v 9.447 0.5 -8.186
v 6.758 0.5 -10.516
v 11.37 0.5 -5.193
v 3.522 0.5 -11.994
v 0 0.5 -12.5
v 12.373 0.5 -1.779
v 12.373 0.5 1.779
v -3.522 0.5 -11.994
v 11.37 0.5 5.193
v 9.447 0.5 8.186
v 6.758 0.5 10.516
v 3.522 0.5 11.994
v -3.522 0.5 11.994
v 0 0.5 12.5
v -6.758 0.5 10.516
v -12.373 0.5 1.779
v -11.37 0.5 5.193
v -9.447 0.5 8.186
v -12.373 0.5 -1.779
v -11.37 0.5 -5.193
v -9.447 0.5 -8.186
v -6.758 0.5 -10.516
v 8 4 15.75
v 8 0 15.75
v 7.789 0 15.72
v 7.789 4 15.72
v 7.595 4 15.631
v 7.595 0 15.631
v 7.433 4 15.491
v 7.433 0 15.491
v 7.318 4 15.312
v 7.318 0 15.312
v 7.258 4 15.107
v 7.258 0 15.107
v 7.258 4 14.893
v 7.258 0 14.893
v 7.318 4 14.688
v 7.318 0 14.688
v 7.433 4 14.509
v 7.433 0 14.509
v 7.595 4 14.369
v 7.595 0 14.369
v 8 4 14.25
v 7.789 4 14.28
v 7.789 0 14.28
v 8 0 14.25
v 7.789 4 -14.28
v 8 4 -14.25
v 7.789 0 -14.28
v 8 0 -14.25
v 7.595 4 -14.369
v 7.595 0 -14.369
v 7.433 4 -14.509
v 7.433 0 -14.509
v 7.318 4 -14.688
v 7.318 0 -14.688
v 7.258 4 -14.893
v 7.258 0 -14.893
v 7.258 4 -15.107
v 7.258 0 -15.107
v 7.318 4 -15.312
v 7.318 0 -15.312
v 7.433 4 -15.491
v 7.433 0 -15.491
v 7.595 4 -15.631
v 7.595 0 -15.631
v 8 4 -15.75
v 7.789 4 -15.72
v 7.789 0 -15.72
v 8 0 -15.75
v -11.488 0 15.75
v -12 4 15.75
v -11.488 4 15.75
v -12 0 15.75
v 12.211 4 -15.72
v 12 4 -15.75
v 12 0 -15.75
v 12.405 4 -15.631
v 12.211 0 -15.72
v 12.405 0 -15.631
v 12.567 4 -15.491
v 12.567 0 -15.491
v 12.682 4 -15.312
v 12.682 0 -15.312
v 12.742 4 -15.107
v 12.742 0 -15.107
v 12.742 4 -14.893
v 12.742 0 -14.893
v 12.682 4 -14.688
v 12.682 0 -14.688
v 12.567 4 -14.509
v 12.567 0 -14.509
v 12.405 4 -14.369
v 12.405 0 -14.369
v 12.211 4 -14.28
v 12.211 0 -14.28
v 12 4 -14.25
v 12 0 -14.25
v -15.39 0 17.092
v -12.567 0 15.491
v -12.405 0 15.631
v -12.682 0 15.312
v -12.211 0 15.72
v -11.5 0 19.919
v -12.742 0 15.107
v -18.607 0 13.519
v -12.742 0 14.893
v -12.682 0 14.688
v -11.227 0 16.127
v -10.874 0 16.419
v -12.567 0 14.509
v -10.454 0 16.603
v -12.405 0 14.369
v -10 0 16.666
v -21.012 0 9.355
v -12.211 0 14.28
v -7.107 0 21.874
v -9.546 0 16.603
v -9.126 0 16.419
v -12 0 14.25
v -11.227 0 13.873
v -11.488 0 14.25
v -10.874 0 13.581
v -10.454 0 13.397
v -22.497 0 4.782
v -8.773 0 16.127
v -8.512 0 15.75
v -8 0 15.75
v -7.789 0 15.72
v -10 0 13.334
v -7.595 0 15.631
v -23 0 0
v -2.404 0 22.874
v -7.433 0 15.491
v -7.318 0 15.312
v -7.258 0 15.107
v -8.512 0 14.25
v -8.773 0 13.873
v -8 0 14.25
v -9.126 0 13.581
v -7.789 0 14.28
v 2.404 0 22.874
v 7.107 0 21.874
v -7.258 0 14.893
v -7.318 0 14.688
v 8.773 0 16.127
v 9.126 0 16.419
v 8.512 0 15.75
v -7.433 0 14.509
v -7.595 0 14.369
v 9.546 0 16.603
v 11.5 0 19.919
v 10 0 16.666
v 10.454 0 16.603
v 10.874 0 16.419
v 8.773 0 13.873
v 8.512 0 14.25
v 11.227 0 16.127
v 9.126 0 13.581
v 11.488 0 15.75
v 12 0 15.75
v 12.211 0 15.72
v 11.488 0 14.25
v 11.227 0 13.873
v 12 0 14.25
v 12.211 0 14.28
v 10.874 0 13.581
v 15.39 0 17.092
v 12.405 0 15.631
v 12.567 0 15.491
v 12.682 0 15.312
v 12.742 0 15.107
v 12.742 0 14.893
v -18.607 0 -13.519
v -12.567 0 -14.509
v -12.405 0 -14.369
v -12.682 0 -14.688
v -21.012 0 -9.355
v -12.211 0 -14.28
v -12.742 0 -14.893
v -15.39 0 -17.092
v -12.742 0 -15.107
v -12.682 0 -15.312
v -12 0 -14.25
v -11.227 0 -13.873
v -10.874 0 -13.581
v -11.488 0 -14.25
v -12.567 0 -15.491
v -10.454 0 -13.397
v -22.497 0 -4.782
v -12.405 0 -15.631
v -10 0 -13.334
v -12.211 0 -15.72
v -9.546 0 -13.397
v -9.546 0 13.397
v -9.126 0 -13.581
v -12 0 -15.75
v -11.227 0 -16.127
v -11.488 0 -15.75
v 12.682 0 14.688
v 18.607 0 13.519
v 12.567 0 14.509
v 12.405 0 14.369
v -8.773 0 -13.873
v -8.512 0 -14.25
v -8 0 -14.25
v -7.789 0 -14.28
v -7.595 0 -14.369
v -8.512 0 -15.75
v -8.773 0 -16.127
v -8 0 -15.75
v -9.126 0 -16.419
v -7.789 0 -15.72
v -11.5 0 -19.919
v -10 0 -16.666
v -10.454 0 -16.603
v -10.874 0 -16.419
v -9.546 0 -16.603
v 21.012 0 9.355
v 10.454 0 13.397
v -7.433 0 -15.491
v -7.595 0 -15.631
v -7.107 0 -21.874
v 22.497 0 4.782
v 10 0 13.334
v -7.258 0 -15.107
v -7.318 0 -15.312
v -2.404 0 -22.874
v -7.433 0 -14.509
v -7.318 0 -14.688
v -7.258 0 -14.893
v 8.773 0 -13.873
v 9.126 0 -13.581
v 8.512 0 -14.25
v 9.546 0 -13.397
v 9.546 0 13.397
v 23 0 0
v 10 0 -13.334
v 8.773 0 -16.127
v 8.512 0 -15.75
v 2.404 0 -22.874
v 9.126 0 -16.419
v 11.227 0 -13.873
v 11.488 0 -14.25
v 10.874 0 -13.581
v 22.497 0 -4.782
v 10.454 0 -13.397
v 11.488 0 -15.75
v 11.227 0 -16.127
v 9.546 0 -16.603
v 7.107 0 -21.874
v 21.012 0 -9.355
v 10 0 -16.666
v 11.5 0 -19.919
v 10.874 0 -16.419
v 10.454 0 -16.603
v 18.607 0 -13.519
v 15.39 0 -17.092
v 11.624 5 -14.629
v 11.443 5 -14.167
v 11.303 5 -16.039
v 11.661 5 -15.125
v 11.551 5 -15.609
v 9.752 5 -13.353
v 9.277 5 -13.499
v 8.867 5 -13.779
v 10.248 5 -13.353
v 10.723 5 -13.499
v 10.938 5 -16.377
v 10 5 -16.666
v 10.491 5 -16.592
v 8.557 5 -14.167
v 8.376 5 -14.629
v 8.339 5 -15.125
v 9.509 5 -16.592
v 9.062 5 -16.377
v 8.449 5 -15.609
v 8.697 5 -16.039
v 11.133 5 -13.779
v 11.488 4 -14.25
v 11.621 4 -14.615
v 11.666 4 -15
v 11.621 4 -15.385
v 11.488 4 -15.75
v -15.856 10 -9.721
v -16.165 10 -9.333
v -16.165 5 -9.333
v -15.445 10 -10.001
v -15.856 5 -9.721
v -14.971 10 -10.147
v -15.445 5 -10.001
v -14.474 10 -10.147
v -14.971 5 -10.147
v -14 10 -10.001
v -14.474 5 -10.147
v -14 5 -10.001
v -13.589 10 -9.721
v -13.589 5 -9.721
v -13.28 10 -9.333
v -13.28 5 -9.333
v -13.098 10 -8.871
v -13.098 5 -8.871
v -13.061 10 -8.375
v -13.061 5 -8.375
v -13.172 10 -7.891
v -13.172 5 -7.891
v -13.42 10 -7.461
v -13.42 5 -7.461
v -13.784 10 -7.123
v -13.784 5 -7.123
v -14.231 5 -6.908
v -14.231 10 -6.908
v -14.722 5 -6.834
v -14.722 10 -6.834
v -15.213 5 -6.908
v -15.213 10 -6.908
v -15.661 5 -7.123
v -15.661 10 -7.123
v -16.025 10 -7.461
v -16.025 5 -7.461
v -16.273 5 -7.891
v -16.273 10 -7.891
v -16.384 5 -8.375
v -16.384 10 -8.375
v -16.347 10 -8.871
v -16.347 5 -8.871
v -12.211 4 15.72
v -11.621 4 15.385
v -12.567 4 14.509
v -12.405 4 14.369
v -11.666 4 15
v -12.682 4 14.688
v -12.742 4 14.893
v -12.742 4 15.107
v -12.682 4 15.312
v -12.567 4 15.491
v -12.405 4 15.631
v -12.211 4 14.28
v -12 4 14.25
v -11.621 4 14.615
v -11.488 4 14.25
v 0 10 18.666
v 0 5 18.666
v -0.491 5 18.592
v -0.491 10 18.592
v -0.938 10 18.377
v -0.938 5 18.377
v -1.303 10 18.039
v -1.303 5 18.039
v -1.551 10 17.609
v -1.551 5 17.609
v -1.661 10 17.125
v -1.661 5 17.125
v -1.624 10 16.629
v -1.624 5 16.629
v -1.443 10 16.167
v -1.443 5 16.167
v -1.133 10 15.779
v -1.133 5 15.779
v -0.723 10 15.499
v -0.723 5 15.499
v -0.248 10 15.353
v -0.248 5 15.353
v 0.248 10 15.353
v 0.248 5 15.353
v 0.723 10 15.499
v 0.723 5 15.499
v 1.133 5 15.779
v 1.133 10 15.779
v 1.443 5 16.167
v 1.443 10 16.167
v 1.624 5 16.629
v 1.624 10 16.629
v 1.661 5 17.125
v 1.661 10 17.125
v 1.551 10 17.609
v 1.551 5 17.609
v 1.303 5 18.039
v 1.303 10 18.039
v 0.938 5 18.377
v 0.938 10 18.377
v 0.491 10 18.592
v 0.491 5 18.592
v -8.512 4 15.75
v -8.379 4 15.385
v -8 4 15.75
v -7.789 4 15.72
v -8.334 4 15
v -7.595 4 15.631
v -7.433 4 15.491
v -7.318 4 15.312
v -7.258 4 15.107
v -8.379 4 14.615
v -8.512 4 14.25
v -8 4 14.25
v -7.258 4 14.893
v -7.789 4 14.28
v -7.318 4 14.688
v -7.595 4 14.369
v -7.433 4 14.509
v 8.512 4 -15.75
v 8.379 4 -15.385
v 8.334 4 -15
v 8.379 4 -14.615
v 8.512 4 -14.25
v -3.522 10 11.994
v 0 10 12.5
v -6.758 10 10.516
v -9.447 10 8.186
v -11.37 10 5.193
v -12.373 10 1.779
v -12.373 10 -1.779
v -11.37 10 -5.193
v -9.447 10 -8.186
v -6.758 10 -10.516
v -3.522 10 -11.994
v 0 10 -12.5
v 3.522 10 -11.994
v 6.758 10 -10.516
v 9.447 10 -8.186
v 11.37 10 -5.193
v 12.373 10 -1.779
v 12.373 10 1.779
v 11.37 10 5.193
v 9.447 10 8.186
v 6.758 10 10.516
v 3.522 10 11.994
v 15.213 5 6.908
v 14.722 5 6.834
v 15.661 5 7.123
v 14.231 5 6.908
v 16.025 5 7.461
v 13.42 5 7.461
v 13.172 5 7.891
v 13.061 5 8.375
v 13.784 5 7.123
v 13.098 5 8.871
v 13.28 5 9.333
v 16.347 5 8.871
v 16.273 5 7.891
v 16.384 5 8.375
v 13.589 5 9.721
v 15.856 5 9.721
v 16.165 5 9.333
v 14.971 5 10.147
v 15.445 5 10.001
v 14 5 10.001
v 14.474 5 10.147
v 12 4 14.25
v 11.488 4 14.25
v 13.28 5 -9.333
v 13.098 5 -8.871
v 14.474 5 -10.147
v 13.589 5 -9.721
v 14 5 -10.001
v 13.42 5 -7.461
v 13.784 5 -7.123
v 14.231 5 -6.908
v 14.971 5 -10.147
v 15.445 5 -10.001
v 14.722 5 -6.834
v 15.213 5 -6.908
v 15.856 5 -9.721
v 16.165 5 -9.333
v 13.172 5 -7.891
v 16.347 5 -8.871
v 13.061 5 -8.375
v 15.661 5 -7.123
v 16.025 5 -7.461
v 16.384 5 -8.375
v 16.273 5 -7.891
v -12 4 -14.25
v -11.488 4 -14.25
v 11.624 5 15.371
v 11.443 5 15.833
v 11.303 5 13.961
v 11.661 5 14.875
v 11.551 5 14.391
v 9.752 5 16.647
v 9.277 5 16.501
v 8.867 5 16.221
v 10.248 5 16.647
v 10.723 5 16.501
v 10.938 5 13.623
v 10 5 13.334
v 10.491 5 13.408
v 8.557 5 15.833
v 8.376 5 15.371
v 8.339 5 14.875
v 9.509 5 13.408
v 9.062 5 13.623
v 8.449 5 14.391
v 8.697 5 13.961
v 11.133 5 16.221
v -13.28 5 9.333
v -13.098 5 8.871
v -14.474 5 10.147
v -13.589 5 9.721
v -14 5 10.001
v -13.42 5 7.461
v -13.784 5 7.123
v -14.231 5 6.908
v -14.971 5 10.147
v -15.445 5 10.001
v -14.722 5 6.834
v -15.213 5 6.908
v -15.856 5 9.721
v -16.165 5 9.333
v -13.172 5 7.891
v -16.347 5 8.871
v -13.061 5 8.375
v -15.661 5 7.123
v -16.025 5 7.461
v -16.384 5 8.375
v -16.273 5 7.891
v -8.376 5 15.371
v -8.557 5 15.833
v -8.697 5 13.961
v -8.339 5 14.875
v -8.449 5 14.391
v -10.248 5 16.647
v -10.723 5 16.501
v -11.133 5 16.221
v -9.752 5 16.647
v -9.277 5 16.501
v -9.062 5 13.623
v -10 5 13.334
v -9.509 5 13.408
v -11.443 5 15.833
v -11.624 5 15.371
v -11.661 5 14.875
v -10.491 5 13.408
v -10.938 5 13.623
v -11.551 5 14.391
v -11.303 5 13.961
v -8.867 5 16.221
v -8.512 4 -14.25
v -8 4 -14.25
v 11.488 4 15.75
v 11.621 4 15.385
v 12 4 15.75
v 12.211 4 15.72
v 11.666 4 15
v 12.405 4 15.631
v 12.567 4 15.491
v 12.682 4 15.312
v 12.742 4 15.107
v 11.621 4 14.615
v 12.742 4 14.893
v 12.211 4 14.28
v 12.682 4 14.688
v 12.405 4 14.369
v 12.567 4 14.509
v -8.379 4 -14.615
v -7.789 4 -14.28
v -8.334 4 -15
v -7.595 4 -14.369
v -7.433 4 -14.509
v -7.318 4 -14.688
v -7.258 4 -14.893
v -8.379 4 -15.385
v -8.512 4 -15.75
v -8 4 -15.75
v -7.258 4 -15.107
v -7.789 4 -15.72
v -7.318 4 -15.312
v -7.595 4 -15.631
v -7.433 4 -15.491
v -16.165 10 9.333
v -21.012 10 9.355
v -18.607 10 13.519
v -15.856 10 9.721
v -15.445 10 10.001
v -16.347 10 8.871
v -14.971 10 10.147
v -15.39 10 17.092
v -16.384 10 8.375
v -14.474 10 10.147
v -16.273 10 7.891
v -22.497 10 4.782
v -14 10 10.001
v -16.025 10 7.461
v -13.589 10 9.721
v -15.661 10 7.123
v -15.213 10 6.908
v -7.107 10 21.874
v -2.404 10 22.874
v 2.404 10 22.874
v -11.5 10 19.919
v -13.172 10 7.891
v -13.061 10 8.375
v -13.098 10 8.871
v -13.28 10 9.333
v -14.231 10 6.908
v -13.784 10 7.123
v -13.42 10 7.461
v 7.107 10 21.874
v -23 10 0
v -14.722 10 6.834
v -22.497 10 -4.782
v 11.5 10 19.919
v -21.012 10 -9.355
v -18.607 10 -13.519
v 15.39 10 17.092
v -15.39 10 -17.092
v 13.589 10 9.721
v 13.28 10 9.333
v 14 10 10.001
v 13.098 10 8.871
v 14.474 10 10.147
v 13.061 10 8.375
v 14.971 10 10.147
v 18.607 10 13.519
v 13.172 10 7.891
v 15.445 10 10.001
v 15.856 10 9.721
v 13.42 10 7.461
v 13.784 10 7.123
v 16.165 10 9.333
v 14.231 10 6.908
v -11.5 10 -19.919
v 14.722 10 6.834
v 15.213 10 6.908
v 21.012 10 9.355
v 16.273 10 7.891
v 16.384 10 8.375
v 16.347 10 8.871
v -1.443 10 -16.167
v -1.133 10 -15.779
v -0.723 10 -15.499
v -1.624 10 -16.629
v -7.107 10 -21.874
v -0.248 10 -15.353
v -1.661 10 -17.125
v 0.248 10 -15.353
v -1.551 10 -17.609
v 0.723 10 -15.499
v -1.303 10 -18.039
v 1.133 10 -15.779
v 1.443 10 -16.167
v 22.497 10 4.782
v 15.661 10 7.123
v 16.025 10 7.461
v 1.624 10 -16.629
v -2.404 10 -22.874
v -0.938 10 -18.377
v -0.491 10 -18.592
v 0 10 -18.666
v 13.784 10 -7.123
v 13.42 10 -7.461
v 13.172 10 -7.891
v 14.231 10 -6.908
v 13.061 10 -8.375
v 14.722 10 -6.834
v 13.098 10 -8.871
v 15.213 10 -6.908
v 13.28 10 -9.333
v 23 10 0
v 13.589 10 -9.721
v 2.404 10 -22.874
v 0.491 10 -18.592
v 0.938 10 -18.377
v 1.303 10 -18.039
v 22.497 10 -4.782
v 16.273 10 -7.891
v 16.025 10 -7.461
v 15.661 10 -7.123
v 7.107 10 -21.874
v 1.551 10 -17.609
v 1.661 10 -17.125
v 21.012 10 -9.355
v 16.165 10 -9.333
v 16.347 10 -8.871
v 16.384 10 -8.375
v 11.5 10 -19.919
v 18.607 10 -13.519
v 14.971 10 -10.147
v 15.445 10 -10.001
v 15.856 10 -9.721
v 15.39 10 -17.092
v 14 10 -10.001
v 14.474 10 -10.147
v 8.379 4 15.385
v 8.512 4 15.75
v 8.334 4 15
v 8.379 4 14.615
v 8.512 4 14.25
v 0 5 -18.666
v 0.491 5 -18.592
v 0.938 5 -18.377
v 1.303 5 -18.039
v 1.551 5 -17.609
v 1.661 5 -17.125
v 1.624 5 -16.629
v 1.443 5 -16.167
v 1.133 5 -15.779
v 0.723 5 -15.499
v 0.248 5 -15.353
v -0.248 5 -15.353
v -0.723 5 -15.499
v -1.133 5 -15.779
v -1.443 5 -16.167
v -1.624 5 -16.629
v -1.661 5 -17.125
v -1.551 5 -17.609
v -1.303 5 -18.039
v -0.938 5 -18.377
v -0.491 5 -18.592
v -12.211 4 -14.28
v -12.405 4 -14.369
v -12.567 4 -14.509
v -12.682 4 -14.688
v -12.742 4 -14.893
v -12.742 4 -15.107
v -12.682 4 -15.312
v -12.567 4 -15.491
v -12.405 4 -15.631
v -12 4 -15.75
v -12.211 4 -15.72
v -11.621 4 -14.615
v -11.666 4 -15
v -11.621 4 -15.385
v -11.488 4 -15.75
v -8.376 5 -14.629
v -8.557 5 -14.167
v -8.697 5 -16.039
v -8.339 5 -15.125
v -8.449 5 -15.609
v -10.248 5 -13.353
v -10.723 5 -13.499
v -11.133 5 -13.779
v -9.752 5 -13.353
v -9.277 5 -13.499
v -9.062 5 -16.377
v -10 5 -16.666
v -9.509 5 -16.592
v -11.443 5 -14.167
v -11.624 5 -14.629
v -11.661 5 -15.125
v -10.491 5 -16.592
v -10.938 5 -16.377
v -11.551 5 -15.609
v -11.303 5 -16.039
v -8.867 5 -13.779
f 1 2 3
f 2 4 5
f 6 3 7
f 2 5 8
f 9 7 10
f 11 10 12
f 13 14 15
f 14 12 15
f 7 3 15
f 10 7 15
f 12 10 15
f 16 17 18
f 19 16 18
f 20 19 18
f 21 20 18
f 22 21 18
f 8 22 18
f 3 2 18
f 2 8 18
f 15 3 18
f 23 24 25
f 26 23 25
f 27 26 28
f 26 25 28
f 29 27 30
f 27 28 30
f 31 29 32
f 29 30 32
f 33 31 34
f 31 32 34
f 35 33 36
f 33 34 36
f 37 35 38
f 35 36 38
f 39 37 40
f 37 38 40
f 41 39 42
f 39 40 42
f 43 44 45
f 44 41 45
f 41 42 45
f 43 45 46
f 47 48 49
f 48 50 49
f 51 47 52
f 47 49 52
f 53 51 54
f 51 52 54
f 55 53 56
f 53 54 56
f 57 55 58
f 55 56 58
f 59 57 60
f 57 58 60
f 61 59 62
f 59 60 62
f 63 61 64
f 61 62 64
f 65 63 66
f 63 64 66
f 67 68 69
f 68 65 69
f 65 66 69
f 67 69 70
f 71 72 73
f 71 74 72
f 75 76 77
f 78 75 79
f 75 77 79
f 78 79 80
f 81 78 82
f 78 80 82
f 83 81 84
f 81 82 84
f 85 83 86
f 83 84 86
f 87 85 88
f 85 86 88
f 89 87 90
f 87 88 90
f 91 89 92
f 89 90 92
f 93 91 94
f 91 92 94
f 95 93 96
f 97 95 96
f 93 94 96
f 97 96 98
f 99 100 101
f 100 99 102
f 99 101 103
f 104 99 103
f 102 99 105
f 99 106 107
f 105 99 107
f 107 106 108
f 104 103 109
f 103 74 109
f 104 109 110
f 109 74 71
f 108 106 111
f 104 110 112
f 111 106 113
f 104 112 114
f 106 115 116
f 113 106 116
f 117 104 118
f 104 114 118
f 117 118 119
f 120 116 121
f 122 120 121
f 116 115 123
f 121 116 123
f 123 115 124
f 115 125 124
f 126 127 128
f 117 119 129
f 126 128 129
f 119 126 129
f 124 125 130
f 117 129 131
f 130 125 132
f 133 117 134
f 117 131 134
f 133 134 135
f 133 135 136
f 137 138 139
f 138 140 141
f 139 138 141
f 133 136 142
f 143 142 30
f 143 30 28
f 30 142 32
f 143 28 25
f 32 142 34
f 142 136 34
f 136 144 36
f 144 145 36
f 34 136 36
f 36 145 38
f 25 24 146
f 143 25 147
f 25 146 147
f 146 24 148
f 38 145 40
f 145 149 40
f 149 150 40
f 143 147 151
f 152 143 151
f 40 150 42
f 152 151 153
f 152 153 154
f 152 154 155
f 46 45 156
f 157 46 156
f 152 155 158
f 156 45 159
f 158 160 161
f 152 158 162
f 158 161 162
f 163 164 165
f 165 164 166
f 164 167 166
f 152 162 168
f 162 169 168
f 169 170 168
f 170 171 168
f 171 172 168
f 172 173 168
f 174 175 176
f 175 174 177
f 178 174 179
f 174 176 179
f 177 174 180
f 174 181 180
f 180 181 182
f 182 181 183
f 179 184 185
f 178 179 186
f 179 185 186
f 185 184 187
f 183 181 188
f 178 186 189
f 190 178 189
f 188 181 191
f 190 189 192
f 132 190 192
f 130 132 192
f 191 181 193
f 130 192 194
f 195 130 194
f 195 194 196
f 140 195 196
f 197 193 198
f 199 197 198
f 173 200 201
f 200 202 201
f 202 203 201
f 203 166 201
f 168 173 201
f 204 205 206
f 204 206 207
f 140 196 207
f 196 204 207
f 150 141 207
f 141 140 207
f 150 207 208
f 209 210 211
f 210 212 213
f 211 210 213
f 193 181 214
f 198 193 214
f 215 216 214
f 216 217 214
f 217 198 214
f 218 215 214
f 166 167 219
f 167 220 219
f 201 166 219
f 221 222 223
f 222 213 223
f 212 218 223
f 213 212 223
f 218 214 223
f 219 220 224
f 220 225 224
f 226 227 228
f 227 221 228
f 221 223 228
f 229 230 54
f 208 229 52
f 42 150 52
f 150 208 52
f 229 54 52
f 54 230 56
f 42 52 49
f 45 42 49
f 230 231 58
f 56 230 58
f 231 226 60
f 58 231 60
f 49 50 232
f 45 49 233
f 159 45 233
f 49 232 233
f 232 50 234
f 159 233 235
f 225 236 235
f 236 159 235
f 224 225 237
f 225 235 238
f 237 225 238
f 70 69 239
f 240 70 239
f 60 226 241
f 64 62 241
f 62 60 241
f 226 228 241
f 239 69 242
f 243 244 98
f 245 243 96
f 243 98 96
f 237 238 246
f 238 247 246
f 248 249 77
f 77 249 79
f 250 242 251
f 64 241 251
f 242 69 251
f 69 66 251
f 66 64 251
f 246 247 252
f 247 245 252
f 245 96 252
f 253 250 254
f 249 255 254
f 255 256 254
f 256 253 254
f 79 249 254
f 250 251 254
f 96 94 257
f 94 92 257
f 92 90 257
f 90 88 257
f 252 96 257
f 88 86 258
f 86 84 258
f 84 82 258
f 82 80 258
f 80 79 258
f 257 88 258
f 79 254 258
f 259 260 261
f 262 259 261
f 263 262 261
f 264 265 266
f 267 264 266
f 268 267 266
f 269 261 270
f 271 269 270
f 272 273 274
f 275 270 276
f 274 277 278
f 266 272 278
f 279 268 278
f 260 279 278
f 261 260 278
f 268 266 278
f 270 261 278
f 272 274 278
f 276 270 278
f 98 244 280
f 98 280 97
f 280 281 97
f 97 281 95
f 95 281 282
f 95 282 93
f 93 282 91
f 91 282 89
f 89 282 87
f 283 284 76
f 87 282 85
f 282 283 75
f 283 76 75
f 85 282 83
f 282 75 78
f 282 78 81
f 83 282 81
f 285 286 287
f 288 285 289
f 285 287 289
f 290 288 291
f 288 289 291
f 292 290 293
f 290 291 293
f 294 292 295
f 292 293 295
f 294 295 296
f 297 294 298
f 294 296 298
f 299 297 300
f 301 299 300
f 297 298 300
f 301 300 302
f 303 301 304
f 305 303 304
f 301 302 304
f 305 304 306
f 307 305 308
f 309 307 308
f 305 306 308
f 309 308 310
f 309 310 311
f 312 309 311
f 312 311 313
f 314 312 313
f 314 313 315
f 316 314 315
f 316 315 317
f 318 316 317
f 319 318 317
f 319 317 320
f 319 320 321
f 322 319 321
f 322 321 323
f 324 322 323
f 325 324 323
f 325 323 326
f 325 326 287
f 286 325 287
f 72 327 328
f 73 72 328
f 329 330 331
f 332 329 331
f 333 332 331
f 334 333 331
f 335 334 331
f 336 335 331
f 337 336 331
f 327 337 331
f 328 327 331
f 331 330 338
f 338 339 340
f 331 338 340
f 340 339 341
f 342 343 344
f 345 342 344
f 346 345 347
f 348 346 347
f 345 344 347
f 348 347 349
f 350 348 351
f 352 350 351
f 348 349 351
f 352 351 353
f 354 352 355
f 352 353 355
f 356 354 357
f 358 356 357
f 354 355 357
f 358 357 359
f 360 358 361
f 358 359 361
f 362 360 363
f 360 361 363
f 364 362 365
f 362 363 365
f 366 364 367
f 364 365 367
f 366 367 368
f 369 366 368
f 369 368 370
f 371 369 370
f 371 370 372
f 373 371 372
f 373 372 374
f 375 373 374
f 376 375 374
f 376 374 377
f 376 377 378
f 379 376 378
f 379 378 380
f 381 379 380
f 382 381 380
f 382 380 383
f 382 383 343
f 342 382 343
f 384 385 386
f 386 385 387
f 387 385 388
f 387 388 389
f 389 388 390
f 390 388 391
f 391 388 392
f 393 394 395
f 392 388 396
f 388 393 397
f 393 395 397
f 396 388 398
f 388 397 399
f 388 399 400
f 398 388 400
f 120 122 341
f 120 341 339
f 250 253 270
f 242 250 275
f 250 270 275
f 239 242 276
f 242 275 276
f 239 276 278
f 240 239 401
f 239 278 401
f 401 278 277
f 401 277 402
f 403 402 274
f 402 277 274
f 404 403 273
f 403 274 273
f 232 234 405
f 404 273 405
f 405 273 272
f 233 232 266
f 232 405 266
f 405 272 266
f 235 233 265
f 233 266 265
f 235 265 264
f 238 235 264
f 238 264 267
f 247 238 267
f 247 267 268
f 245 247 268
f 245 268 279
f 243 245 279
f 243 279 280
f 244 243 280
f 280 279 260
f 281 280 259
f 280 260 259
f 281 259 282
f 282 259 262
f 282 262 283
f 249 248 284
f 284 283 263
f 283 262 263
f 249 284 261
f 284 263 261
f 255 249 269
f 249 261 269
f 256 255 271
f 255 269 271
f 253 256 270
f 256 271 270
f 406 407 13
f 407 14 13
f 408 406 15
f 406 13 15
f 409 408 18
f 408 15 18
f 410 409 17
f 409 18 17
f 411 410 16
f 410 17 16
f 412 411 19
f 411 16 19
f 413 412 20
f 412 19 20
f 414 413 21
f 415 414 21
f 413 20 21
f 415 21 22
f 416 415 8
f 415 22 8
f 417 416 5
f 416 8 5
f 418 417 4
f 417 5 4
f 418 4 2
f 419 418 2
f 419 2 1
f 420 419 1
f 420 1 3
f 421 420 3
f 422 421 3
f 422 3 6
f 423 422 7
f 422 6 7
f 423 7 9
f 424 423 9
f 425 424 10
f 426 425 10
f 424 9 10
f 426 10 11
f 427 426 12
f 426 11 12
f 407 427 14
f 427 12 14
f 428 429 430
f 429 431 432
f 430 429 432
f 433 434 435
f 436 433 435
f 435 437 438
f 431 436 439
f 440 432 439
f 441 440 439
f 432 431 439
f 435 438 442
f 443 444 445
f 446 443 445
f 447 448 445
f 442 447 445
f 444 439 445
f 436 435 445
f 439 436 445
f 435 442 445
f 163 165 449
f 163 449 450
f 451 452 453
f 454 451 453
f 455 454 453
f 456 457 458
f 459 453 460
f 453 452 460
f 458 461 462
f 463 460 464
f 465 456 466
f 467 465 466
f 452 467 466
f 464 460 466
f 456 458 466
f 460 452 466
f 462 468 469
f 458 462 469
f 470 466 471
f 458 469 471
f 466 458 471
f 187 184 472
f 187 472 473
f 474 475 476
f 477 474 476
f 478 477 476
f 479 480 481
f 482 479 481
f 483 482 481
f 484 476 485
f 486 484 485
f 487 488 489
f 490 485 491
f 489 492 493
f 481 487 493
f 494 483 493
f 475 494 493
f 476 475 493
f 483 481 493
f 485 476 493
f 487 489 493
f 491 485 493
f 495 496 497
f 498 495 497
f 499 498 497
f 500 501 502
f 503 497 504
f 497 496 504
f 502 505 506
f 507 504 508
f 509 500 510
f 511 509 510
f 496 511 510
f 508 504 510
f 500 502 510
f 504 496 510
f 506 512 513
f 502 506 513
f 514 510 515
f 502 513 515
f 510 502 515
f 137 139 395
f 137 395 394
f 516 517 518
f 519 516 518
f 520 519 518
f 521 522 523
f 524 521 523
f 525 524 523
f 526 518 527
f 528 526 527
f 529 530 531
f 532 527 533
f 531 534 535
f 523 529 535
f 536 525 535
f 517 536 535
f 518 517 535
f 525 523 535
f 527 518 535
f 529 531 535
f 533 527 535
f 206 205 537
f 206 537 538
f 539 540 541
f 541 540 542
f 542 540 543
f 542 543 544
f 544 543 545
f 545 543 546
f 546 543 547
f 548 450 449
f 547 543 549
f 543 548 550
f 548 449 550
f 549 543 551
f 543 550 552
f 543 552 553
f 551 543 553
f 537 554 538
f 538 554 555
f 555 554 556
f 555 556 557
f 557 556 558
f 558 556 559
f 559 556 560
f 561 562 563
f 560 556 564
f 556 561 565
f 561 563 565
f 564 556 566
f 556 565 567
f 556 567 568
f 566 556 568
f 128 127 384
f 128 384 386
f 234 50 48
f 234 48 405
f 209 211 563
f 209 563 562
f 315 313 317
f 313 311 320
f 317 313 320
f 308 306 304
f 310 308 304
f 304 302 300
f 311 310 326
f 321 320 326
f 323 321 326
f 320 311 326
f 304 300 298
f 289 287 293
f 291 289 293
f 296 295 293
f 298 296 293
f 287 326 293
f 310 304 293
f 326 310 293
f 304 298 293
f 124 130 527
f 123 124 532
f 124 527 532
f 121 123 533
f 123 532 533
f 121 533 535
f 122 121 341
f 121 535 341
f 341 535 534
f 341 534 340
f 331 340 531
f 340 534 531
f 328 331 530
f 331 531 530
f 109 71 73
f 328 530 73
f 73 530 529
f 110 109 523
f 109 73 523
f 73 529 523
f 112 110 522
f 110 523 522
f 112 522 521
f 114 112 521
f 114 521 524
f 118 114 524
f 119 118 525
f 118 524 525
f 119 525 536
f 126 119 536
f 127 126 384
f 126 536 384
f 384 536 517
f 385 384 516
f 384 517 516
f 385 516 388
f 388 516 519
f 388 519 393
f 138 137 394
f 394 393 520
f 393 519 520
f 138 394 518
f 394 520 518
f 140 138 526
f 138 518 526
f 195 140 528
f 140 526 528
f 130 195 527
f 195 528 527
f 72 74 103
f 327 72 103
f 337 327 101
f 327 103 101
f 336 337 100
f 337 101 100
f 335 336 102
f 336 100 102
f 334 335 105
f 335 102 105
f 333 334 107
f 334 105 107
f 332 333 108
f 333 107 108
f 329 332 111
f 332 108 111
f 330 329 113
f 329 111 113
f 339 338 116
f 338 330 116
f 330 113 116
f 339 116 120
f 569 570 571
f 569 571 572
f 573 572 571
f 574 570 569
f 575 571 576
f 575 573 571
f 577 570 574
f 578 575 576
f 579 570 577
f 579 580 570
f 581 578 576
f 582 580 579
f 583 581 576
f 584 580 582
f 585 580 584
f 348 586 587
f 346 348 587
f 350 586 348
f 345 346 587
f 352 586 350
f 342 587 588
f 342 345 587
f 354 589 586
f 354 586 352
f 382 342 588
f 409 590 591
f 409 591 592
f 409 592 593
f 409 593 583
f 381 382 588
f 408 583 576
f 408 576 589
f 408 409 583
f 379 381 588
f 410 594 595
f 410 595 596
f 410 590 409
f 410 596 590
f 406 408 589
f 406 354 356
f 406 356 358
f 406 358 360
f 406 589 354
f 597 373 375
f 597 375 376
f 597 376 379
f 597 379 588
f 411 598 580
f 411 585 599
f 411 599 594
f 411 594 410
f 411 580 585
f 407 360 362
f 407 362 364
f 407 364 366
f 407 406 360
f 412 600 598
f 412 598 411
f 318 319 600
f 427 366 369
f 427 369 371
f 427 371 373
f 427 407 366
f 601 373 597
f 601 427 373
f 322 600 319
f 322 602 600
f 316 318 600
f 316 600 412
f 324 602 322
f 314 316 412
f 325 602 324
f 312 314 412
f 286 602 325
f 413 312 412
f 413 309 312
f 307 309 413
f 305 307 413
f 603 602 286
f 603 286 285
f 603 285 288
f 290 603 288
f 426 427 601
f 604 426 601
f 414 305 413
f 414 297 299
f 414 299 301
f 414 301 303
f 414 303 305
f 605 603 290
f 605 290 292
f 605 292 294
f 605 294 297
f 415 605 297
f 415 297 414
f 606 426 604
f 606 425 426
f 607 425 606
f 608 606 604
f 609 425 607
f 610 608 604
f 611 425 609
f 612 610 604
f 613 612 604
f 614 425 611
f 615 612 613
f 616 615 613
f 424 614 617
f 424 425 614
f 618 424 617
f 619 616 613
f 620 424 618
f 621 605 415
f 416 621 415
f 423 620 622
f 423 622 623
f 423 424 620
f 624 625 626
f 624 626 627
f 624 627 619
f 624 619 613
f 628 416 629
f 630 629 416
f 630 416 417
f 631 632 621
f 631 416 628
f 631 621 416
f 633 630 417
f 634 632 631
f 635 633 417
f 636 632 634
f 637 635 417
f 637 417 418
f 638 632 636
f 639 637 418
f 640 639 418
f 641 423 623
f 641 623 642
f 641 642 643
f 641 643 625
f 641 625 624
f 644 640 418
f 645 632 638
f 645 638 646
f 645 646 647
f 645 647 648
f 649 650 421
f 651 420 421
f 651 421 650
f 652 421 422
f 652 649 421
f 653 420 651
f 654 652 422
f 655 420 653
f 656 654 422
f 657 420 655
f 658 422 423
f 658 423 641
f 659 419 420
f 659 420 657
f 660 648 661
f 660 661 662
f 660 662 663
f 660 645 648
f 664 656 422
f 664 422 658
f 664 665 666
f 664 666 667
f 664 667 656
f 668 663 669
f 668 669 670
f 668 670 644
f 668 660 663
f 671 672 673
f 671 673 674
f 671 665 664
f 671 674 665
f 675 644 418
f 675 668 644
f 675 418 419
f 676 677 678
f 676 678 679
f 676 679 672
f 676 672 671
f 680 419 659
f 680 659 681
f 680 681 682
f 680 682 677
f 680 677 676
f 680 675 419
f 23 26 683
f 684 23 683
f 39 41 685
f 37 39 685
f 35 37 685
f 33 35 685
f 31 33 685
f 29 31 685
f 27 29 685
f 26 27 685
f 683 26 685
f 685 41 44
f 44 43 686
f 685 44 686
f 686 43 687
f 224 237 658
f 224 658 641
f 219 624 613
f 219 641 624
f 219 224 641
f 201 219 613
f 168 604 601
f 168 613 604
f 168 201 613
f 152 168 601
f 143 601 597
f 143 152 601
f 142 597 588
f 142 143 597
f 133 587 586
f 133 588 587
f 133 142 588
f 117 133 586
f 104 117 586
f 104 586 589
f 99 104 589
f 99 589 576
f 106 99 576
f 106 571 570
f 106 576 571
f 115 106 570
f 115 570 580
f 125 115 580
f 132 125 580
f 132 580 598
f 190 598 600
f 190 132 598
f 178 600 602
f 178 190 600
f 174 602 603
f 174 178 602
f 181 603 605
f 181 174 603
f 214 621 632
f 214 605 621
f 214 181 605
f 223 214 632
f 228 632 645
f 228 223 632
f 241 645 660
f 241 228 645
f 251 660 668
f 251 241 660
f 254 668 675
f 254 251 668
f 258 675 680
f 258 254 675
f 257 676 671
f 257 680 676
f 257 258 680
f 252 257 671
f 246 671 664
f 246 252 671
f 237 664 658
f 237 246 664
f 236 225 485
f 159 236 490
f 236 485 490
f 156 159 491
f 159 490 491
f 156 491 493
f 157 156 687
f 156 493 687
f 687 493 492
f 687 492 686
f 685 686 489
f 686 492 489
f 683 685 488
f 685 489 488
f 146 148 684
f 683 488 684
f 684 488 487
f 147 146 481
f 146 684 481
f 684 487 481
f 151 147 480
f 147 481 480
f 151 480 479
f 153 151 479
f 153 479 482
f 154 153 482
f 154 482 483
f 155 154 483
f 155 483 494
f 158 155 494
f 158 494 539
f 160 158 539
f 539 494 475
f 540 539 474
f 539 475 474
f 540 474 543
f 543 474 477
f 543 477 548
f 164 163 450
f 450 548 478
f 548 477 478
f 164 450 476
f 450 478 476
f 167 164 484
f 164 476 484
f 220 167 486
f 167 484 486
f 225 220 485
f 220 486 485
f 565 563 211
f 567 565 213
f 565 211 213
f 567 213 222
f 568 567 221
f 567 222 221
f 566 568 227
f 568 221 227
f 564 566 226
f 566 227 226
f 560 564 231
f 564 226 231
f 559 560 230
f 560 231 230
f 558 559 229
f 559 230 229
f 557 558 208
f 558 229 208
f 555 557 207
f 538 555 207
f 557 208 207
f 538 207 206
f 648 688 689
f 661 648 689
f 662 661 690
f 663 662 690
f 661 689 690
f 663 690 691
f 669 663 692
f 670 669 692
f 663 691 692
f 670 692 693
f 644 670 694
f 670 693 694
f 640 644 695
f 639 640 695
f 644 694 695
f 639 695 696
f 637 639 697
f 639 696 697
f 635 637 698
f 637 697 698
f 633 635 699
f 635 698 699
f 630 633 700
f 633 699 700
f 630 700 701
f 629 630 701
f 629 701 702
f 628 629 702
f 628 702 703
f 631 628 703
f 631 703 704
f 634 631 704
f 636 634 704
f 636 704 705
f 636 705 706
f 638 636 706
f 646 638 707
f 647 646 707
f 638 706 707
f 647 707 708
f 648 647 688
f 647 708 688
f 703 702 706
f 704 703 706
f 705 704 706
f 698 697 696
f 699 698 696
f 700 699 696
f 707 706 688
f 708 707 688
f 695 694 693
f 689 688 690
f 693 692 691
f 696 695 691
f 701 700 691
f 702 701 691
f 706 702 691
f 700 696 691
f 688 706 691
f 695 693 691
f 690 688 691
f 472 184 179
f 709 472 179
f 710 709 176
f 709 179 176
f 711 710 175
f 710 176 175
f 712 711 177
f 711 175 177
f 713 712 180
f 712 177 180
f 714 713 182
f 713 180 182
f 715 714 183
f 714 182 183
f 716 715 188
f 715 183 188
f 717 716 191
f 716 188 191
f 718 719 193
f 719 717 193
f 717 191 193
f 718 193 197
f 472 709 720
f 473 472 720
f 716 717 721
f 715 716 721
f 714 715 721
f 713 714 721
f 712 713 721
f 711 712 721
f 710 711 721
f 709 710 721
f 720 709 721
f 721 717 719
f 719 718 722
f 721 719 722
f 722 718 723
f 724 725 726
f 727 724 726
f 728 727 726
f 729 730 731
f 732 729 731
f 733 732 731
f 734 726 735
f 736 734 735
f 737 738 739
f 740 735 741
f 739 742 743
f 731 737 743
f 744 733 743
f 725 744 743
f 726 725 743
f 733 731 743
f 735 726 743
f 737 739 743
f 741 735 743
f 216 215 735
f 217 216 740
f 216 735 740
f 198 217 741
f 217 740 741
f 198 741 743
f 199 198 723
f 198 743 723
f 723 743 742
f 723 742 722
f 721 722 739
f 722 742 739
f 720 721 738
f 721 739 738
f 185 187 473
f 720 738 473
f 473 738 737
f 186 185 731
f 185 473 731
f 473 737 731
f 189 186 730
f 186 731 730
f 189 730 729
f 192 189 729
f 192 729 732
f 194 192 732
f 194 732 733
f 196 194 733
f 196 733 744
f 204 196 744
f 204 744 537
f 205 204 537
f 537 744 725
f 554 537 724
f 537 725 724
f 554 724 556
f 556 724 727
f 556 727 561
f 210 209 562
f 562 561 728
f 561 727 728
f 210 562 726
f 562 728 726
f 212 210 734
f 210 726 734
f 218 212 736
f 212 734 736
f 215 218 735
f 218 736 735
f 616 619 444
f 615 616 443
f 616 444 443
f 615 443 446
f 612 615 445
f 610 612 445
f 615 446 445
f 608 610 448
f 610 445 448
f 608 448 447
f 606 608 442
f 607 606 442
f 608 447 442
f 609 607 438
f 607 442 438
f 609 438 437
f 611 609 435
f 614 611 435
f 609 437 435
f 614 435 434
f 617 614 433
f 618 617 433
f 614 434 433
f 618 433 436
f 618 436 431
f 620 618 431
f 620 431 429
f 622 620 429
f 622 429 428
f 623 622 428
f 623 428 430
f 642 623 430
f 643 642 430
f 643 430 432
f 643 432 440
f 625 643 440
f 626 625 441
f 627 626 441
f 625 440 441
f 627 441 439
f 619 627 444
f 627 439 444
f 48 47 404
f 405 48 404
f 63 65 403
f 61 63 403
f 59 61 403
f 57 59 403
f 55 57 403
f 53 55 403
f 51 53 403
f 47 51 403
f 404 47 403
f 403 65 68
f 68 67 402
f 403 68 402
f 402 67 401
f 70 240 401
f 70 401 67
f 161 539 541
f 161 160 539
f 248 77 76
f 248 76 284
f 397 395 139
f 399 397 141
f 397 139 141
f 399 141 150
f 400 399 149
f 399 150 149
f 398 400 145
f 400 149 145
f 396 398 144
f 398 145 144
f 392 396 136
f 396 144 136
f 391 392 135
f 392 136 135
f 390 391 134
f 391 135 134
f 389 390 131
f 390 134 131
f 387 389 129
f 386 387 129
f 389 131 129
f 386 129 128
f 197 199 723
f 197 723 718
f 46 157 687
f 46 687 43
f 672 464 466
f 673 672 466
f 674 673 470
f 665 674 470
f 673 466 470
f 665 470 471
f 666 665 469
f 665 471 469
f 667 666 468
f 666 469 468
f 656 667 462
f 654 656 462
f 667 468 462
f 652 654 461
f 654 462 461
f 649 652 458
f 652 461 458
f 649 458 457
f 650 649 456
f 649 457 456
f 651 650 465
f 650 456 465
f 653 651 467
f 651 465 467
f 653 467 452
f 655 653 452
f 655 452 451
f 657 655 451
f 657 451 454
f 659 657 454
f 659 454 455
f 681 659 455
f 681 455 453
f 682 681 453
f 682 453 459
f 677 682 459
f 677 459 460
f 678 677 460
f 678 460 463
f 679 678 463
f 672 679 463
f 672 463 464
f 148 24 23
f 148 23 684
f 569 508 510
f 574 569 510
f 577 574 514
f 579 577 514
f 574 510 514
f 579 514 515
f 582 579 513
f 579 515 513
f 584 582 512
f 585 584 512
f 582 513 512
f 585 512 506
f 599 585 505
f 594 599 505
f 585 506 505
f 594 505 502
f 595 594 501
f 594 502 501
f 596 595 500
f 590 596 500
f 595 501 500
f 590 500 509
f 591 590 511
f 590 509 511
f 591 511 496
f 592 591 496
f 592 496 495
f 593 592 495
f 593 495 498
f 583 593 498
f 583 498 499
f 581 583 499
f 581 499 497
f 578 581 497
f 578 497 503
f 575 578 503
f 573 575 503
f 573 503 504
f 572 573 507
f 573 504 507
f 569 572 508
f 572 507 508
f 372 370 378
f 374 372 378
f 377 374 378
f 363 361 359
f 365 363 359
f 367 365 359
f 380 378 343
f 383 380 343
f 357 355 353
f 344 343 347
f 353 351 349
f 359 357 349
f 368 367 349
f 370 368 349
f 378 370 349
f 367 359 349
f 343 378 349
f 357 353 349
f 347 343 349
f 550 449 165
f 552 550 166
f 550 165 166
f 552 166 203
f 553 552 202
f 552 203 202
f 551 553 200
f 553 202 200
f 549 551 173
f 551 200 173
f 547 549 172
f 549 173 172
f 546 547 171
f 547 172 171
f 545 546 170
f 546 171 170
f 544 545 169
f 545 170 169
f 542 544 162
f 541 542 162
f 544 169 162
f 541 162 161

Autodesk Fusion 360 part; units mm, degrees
sketch "Sketch1" plane through (0, 0, 0) normal (0, 1, 0) x (1, 0, 0)
  circle A0 centre (0, 0) radius 23
  line L0 (-10, -15) -> (10, -15)
  line L1 (10, -15) -> (10, 15)
  line L2 (10, 15) -> (-10, 15)
  line L3 (-10, 15) -> (-10, -15)
  line L4 (1.75, 0) -> (22.5, 0) construction
  line L5 (0, -1.75) -> (0, -22.5) construction
  line L6 (-8, -14.25) -> (-12, -14.25)
  arc A1 (-12, -14.25) -> (-12, -15.75) centre (-12, -15) ccw
  line L7 (-12, -15.75) -> (-8, -15.75)
  arc A2 (-8, -15.75) -> (-8, -14.25) centre (-8, -15) ccw
  line L8 (-8, -15) -> (-12, -15) construction
  point P0 (-10, -15)
  point P1 (10, -15)
  point P2 (10, 15)
  point P3 (-10, 15)
  point P4 (-10, -15)
  point P5 (0, -17)
  dimension "d1" = 46
  dimension "d8" = 20
  dimension "d9" = 30
  dimension "d10" = 4
  dimension "d11" = 1.5
  dimension "d21" = 17
extrude "Extrude1" add sketch "Sketch1" along normal blind 10 contours A0 | L0 L3 L6 A2 | L0 L3 L6 A1 L7 A2 | L0 L1 L2 L3 L6 A2
hole "Hole1" at (0, 10, 0) direction (0, -1, 0) diameter 25 depth 9.5 tip angle 180
hole "Hole2" at (-10, 0, 15) direction (0, 1, 0) diameter 3.332 depth 5 tip angle 180
extrude "Extrude2" cut sketch "Sketch1" along normal blind 4 contours L0 L3 L6 A2 | L0 L3 L6 A1 L7 A2
pattern_linear "R-Pattern1" count 2 spacing 20 along (1, 0, 0) count 2 spacing 30 along (0, 0, -1) of "Extrude2", "Hole2"
sketch "Sketch2" plane through (0, 10, 0) normal (0, 1, 0) x (-1, 0, 0)
  circle A0 centre (0, 0) radius 12.5
  circle A1 centre (0, 0) radius 23
  point P0 (0, 17)
hole "Hole3" at (0, 10, 17) direction (0, -1, 0) diameter 3.332 depth 5 tip angle 180
pattern_circular "C-Pattern1" count 6 over 360 about axis through (0, 1.75, 0) along (0, 1, 0) of "Hole3"
